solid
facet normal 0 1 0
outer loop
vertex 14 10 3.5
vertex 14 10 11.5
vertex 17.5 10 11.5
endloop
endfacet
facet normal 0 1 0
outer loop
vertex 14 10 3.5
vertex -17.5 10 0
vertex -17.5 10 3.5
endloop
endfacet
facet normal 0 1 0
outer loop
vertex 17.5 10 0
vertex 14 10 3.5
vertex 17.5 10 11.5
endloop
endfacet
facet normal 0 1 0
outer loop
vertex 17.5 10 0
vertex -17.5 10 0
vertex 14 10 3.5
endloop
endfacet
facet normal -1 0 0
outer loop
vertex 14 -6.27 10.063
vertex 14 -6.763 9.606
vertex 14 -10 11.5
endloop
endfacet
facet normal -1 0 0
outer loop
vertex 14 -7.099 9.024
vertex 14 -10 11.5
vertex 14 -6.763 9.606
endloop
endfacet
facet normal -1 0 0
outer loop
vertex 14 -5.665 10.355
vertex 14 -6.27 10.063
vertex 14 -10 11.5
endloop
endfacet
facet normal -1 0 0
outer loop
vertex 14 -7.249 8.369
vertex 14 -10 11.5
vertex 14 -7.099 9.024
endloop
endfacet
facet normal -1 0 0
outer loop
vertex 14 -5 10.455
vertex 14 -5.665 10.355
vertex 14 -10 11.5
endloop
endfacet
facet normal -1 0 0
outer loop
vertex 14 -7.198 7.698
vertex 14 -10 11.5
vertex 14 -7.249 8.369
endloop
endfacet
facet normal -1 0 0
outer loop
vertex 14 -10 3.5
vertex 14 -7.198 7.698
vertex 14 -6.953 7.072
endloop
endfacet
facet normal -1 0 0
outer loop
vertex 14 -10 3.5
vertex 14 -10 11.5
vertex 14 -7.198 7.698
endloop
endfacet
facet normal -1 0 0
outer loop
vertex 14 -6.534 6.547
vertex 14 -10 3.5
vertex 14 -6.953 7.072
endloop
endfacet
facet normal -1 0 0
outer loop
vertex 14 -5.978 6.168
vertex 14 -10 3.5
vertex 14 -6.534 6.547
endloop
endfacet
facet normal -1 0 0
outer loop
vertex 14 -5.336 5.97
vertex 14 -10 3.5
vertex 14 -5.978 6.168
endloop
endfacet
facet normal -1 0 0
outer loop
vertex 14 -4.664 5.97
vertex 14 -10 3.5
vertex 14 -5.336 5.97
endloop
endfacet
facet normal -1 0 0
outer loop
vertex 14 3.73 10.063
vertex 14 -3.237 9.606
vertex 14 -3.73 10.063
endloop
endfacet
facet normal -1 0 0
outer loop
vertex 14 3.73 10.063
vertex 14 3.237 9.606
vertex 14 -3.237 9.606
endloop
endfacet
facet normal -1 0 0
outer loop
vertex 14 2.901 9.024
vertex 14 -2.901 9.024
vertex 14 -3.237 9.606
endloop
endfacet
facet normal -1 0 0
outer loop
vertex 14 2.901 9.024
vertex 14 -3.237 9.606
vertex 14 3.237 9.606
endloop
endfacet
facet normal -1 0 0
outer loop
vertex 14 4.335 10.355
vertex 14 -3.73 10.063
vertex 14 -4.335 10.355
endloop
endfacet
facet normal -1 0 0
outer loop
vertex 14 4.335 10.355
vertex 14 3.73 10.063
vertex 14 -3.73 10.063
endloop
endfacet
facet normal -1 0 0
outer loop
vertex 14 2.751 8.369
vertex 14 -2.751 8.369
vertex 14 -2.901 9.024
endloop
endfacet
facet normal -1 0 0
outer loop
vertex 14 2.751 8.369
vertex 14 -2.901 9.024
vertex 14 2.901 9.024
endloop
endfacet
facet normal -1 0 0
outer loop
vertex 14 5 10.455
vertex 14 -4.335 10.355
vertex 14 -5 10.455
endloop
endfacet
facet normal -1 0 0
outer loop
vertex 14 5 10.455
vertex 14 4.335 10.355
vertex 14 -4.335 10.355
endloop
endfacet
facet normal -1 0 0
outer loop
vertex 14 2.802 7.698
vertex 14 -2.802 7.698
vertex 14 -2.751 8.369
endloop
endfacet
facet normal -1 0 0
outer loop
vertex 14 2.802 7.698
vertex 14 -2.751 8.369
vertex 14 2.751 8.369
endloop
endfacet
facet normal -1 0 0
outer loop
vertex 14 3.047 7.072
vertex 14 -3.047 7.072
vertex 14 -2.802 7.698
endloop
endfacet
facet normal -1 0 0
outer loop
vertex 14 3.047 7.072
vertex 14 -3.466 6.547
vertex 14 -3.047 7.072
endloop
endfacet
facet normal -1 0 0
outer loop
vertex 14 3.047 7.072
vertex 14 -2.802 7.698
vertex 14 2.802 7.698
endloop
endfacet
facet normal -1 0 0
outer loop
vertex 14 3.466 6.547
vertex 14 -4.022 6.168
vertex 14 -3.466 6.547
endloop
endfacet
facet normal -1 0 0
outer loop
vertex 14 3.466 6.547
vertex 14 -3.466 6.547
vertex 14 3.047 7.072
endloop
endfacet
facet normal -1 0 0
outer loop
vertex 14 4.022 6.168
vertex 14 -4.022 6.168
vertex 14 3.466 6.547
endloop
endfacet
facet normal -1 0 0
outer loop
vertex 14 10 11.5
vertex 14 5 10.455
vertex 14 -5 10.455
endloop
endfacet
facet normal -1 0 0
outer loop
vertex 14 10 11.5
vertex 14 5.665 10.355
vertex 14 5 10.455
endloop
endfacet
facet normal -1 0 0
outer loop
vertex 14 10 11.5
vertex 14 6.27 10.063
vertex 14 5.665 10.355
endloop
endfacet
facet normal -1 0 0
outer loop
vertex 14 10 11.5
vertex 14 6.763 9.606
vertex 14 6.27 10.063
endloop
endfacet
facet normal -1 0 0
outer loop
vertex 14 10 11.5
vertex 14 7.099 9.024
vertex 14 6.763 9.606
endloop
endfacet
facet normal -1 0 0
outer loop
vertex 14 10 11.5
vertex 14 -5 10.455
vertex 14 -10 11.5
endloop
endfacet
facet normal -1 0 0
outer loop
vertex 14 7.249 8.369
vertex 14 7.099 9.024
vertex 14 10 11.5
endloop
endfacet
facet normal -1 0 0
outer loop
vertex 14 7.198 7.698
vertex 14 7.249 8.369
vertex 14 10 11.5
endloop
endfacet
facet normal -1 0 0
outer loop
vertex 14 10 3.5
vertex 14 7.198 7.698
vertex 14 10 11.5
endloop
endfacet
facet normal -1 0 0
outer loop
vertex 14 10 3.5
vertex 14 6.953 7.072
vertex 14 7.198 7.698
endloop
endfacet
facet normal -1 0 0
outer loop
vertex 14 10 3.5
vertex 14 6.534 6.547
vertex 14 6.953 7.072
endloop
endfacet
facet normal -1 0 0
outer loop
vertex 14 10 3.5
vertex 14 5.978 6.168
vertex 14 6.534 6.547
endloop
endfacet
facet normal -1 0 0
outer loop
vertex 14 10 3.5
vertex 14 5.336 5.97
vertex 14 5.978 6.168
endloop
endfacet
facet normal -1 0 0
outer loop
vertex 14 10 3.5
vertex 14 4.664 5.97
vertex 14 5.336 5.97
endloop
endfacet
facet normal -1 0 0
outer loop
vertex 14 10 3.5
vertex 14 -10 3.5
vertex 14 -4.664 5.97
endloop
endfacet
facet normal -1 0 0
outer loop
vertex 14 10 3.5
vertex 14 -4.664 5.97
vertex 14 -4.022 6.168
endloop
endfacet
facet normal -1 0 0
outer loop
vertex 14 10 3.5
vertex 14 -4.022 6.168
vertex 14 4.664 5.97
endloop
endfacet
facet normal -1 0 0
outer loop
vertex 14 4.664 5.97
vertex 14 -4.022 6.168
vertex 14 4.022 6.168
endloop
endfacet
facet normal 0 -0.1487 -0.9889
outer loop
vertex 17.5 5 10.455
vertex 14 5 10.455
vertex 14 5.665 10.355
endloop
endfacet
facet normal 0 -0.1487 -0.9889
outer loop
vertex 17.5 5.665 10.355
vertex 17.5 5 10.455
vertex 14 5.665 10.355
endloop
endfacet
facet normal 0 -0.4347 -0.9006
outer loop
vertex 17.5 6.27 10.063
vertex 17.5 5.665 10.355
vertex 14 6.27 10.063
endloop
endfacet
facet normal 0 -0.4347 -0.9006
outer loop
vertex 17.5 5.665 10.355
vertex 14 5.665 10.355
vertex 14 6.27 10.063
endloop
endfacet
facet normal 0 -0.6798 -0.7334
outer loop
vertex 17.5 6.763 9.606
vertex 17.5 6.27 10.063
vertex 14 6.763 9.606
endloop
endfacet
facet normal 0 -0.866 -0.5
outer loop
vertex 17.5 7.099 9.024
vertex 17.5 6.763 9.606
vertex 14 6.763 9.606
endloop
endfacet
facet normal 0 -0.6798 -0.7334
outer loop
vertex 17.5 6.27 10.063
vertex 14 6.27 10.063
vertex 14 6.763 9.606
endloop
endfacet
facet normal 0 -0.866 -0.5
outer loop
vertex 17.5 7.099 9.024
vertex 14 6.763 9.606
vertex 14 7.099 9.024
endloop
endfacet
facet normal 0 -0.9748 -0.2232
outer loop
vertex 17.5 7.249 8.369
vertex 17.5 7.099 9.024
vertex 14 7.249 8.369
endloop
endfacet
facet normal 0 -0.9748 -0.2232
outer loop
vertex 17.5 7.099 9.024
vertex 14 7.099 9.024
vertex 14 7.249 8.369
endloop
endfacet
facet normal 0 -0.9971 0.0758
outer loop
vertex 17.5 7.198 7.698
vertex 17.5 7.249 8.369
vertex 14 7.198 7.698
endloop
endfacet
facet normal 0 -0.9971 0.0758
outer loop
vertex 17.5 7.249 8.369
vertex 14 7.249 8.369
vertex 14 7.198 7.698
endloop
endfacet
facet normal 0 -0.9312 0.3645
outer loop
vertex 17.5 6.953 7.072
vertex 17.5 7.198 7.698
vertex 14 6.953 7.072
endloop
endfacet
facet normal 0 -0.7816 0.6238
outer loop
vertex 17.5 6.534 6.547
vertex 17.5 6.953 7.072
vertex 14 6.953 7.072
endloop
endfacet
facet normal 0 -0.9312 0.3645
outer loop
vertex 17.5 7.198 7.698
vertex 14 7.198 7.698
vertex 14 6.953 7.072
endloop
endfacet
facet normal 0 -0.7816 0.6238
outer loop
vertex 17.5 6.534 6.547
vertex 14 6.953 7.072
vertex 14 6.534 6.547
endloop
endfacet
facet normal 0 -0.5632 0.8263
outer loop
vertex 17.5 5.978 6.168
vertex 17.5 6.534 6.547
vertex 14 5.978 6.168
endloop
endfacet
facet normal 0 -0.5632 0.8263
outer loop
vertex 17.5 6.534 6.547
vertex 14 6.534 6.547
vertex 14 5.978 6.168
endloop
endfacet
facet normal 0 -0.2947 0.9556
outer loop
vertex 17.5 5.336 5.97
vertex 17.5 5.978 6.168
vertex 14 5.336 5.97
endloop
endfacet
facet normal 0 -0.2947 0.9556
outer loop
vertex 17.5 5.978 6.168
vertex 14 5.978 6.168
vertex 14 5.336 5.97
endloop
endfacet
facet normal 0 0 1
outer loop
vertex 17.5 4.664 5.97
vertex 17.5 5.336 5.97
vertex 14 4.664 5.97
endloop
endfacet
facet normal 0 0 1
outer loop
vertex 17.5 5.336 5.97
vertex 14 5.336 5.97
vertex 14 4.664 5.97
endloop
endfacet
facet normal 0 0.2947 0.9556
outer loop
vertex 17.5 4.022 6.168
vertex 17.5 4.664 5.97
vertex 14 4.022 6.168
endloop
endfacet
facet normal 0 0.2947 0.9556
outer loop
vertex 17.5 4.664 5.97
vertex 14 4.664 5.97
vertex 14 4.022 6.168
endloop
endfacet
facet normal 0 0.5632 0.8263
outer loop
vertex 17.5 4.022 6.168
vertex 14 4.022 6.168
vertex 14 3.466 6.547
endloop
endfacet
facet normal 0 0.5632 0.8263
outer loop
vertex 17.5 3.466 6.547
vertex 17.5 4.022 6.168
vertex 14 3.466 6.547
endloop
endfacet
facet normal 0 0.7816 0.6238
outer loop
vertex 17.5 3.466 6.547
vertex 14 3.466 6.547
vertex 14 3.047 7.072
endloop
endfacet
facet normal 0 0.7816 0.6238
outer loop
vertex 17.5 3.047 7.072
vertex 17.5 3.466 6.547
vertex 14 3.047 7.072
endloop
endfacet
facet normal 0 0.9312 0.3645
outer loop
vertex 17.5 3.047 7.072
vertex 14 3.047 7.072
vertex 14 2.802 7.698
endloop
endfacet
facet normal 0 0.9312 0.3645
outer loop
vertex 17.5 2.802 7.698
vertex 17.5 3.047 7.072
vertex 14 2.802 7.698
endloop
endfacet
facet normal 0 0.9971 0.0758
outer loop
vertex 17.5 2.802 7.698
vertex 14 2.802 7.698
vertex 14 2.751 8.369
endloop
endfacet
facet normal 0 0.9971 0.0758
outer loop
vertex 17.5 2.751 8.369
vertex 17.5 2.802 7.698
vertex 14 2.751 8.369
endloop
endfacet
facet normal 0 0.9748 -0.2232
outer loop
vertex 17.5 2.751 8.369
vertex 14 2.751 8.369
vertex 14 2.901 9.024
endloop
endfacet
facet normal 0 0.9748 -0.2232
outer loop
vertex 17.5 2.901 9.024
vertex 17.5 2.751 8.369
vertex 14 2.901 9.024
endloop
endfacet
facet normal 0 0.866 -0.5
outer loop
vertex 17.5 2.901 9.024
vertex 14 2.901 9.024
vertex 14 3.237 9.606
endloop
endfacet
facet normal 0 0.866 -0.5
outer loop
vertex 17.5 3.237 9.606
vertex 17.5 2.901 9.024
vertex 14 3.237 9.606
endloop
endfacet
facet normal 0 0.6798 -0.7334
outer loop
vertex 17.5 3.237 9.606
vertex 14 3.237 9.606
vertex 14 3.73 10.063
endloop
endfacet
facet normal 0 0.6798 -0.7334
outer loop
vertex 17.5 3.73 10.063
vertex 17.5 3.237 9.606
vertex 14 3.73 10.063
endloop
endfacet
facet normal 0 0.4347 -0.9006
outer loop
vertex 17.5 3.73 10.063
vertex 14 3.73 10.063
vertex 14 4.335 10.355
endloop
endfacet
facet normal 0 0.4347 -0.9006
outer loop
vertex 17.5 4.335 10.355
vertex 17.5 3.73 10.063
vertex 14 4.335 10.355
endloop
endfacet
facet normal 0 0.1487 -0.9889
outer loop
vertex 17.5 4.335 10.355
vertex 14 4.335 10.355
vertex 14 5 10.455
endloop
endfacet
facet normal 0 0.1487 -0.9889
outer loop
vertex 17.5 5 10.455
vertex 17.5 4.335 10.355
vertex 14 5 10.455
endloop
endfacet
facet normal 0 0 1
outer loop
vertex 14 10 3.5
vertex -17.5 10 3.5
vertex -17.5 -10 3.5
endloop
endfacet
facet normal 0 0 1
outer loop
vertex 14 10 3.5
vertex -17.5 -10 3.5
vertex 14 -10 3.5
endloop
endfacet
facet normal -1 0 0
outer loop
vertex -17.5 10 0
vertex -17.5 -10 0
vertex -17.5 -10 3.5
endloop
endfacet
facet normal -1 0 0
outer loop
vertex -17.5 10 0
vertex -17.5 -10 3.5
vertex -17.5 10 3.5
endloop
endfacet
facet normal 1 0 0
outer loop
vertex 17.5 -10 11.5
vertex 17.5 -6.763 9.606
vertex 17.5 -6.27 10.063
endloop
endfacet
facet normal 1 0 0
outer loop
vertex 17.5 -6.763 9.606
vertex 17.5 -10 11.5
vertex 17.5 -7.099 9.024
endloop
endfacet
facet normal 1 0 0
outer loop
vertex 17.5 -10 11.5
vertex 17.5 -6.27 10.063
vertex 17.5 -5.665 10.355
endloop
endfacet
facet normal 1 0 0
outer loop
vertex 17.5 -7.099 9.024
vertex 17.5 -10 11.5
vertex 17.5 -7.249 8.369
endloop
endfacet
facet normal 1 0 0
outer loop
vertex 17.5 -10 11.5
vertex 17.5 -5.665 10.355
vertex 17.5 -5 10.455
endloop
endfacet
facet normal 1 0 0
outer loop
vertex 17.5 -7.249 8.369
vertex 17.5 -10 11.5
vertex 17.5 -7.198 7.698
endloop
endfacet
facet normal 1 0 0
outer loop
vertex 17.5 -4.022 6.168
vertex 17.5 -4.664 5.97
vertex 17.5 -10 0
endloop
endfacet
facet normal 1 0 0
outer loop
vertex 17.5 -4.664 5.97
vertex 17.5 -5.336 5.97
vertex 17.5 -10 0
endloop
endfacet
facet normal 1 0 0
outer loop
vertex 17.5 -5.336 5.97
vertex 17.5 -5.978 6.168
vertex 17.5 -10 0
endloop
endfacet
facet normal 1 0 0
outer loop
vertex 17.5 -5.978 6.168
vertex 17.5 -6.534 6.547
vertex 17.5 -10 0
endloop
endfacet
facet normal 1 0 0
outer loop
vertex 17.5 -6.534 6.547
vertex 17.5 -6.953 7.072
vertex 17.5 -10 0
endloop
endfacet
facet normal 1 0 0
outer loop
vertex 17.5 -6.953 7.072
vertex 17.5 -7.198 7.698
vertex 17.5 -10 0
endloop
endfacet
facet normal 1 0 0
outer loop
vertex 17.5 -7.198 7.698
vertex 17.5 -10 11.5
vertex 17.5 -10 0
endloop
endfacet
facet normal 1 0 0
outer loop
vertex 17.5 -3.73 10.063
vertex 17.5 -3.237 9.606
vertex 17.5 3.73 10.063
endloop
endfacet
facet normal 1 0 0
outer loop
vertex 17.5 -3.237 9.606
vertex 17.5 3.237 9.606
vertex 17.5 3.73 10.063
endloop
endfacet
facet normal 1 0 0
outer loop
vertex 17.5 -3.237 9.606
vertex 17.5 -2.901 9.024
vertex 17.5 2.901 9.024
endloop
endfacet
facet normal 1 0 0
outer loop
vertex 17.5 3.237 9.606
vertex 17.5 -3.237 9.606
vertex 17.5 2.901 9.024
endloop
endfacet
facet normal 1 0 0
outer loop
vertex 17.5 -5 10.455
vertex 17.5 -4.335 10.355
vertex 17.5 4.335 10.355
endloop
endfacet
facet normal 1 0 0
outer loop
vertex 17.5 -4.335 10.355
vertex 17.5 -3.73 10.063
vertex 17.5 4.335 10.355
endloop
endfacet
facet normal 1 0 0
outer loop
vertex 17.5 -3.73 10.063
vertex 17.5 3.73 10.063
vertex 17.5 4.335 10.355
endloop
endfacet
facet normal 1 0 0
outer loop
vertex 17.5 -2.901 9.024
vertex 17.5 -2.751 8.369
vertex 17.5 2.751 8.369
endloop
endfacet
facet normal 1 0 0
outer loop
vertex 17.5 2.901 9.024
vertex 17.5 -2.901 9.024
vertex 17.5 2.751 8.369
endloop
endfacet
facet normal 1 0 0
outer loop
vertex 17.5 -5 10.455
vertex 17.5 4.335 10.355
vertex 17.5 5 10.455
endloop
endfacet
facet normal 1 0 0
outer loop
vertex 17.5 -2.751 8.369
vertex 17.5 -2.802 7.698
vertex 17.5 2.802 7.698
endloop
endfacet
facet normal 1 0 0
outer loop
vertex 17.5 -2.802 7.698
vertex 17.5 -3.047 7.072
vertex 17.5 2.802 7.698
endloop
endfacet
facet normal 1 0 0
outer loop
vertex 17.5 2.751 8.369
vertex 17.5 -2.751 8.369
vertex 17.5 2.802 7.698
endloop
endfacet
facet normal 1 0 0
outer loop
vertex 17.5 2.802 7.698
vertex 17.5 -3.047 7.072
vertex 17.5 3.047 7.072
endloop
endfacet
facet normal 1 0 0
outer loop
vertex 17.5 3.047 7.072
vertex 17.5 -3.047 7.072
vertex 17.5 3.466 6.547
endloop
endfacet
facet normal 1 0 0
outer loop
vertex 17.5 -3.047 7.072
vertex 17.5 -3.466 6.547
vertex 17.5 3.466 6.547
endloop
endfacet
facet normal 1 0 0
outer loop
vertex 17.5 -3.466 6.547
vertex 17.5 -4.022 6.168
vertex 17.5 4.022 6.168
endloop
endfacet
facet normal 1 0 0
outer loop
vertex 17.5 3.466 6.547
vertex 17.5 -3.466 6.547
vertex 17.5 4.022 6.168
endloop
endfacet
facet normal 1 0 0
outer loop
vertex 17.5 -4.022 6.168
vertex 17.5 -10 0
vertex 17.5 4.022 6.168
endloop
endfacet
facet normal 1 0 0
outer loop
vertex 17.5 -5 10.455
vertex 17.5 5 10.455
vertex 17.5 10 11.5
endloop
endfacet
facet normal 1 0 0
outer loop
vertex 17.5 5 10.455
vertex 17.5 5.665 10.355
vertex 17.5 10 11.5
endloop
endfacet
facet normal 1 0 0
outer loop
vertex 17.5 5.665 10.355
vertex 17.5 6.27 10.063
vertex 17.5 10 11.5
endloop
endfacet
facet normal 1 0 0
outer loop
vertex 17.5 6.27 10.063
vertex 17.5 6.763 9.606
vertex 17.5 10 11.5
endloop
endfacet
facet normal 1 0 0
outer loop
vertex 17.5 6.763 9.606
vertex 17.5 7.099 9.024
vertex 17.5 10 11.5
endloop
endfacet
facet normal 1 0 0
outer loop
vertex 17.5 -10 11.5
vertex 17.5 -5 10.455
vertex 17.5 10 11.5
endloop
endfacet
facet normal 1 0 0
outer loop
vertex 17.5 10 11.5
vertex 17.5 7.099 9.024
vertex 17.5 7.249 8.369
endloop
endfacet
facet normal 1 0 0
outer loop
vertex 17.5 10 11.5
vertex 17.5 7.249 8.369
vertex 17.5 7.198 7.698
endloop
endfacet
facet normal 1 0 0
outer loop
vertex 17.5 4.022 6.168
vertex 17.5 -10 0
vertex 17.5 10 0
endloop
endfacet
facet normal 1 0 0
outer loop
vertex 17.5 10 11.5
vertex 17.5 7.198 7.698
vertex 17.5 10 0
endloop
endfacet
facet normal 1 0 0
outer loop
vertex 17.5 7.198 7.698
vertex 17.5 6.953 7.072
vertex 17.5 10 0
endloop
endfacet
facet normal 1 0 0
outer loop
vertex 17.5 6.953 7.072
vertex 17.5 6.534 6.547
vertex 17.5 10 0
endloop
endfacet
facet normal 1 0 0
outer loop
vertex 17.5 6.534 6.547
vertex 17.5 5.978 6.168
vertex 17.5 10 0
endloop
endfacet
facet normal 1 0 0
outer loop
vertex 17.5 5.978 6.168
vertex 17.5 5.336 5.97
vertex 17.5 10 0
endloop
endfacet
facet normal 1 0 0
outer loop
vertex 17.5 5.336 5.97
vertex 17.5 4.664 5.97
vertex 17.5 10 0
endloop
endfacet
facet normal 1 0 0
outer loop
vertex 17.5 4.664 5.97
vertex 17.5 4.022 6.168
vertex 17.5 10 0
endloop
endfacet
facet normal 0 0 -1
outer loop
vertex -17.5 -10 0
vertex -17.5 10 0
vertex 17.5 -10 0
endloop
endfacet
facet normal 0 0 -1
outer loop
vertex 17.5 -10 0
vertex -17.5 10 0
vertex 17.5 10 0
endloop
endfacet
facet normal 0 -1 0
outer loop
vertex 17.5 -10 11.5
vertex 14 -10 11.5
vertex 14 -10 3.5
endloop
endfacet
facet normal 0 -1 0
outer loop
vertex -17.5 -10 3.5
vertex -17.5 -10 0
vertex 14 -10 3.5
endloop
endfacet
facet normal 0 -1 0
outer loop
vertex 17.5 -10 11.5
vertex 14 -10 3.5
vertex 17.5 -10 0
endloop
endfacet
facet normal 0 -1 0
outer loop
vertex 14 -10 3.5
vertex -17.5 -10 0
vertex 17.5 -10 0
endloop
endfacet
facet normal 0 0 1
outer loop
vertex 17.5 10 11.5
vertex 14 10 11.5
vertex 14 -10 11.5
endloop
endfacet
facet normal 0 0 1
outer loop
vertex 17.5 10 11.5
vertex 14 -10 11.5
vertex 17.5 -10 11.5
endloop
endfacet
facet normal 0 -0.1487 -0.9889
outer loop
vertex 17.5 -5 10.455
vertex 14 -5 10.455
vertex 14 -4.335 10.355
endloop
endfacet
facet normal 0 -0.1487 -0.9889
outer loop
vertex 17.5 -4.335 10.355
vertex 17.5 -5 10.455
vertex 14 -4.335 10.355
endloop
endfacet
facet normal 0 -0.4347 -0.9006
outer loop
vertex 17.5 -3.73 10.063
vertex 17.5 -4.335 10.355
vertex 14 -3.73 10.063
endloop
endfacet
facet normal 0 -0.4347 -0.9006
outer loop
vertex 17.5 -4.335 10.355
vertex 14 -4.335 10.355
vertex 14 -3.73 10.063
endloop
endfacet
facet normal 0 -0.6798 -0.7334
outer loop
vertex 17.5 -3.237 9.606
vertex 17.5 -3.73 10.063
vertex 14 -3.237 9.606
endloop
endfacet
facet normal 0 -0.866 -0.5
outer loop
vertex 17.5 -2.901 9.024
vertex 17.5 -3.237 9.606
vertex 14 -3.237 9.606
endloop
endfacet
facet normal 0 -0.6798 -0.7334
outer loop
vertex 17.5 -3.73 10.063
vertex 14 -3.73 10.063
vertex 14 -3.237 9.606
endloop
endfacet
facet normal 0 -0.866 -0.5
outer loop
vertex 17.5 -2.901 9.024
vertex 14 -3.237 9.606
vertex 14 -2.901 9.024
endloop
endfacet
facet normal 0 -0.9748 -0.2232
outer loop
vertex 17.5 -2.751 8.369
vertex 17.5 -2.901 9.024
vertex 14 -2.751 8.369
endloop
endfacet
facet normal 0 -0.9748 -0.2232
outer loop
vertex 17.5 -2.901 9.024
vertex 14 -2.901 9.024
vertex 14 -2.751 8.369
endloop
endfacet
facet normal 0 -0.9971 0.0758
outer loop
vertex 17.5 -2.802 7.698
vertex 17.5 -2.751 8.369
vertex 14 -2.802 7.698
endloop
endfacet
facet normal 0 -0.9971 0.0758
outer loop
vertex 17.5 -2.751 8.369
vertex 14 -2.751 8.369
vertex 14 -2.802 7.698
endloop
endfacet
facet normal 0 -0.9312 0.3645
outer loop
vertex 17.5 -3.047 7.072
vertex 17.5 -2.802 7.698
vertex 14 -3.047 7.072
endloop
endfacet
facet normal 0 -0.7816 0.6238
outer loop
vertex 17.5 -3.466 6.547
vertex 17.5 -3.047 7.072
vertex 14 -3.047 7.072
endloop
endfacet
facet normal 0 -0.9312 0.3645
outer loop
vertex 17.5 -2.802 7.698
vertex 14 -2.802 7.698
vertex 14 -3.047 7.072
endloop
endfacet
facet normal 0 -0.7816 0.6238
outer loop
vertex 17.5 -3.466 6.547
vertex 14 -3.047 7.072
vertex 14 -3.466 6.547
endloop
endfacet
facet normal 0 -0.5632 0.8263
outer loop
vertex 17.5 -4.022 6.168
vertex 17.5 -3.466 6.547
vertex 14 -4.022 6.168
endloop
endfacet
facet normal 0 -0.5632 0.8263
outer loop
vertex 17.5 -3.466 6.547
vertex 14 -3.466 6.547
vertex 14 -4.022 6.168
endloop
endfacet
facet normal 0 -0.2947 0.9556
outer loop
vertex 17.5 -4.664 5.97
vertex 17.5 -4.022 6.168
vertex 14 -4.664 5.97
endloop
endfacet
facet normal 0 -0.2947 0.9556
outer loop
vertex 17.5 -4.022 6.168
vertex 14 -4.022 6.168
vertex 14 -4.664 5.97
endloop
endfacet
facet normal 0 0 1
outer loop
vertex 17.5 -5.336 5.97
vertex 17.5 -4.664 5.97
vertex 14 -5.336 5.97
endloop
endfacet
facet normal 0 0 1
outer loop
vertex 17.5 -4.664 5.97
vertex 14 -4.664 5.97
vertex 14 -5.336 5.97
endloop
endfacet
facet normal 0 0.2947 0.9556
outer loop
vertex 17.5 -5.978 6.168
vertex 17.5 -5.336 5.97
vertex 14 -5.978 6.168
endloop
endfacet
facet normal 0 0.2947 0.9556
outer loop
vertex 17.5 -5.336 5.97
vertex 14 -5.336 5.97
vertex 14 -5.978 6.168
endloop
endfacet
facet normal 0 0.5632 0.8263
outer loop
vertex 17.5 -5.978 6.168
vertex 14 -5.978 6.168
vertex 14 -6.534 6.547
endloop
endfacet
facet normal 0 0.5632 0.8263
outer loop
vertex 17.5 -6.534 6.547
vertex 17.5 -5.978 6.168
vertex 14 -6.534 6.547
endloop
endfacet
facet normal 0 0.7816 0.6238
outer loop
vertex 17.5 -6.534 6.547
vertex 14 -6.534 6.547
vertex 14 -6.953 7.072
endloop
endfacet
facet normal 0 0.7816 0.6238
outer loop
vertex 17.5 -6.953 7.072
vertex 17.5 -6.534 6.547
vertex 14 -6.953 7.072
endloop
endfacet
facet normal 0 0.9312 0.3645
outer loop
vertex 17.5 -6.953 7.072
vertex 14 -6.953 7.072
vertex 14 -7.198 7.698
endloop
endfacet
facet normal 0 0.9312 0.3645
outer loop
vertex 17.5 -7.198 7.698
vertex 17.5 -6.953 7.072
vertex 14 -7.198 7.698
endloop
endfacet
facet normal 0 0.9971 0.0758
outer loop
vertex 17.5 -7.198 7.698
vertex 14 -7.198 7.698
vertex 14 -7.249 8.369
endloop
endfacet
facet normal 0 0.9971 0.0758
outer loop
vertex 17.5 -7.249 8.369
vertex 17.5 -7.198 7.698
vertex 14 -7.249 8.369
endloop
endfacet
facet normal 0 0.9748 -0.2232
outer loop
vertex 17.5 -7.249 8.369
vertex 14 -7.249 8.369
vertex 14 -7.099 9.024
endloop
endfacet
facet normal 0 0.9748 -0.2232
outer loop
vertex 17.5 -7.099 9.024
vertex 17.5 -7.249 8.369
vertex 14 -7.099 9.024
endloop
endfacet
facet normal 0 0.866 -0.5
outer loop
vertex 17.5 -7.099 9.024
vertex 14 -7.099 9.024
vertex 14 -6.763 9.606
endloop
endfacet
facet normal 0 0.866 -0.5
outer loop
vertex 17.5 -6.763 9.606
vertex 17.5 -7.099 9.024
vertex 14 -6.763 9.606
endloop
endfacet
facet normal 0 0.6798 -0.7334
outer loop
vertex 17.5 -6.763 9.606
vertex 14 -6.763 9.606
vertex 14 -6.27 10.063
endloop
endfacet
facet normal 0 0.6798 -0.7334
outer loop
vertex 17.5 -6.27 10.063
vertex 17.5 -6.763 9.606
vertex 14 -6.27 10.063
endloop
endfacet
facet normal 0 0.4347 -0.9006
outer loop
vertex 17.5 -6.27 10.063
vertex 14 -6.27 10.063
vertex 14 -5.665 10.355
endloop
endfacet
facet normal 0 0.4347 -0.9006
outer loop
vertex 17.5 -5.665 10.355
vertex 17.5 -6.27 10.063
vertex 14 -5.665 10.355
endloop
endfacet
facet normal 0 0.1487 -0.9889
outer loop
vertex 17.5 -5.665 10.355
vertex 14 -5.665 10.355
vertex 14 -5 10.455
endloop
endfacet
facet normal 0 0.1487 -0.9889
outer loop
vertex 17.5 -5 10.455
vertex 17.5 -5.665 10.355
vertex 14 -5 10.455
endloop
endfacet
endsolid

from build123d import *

# Parameters (mm, degrees)
SKETCH_1_W          = 35
SKETCH_1_H          = 20
EXTRUDE_1_DEPTH     = 3.5
SKETCH_2_W          = 3.5
SKETCH_2_H          = 20
EXTRUDE_2_DEPTH     = 8
SKETCH_3_R          = 2.255
CUT_EXTRUDE_1_DEPTH = 8


with BuildPart() as part:
    # 草图1 → 凸台-拉伸1 (new body)
    with BuildSketch(Plane.XY):
        Rectangle(SKETCH_1_W, SKETCH_1_H)
    extrude(amount=EXTRUDE_1_DEPTH)

    # 草图2 → 凸台-拉伸2 (add)
    with BuildSketch(Plane.XY.offset(3.5)):
        with Locations((15.75, 0)):
            Rectangle(SKETCH_2_W, SKETCH_2_H)
    extrude(amount=EXTRUDE_2_DEPTH)

    # 草图3 → 切除-拉伸1 (cut)
    with BuildSketch(Plane.ZY.offset(-14)):
        with Locations((8.2, 5)):
            Circle(SKETCH_3_R)
        with Locations((8.2, -5)):
            Circle(SKETCH_3_R)
    extrude(amount=-CUT_EXTRUDE_1_DEPTH, mode=Mode.SUBTRACT)


solid = part.part
